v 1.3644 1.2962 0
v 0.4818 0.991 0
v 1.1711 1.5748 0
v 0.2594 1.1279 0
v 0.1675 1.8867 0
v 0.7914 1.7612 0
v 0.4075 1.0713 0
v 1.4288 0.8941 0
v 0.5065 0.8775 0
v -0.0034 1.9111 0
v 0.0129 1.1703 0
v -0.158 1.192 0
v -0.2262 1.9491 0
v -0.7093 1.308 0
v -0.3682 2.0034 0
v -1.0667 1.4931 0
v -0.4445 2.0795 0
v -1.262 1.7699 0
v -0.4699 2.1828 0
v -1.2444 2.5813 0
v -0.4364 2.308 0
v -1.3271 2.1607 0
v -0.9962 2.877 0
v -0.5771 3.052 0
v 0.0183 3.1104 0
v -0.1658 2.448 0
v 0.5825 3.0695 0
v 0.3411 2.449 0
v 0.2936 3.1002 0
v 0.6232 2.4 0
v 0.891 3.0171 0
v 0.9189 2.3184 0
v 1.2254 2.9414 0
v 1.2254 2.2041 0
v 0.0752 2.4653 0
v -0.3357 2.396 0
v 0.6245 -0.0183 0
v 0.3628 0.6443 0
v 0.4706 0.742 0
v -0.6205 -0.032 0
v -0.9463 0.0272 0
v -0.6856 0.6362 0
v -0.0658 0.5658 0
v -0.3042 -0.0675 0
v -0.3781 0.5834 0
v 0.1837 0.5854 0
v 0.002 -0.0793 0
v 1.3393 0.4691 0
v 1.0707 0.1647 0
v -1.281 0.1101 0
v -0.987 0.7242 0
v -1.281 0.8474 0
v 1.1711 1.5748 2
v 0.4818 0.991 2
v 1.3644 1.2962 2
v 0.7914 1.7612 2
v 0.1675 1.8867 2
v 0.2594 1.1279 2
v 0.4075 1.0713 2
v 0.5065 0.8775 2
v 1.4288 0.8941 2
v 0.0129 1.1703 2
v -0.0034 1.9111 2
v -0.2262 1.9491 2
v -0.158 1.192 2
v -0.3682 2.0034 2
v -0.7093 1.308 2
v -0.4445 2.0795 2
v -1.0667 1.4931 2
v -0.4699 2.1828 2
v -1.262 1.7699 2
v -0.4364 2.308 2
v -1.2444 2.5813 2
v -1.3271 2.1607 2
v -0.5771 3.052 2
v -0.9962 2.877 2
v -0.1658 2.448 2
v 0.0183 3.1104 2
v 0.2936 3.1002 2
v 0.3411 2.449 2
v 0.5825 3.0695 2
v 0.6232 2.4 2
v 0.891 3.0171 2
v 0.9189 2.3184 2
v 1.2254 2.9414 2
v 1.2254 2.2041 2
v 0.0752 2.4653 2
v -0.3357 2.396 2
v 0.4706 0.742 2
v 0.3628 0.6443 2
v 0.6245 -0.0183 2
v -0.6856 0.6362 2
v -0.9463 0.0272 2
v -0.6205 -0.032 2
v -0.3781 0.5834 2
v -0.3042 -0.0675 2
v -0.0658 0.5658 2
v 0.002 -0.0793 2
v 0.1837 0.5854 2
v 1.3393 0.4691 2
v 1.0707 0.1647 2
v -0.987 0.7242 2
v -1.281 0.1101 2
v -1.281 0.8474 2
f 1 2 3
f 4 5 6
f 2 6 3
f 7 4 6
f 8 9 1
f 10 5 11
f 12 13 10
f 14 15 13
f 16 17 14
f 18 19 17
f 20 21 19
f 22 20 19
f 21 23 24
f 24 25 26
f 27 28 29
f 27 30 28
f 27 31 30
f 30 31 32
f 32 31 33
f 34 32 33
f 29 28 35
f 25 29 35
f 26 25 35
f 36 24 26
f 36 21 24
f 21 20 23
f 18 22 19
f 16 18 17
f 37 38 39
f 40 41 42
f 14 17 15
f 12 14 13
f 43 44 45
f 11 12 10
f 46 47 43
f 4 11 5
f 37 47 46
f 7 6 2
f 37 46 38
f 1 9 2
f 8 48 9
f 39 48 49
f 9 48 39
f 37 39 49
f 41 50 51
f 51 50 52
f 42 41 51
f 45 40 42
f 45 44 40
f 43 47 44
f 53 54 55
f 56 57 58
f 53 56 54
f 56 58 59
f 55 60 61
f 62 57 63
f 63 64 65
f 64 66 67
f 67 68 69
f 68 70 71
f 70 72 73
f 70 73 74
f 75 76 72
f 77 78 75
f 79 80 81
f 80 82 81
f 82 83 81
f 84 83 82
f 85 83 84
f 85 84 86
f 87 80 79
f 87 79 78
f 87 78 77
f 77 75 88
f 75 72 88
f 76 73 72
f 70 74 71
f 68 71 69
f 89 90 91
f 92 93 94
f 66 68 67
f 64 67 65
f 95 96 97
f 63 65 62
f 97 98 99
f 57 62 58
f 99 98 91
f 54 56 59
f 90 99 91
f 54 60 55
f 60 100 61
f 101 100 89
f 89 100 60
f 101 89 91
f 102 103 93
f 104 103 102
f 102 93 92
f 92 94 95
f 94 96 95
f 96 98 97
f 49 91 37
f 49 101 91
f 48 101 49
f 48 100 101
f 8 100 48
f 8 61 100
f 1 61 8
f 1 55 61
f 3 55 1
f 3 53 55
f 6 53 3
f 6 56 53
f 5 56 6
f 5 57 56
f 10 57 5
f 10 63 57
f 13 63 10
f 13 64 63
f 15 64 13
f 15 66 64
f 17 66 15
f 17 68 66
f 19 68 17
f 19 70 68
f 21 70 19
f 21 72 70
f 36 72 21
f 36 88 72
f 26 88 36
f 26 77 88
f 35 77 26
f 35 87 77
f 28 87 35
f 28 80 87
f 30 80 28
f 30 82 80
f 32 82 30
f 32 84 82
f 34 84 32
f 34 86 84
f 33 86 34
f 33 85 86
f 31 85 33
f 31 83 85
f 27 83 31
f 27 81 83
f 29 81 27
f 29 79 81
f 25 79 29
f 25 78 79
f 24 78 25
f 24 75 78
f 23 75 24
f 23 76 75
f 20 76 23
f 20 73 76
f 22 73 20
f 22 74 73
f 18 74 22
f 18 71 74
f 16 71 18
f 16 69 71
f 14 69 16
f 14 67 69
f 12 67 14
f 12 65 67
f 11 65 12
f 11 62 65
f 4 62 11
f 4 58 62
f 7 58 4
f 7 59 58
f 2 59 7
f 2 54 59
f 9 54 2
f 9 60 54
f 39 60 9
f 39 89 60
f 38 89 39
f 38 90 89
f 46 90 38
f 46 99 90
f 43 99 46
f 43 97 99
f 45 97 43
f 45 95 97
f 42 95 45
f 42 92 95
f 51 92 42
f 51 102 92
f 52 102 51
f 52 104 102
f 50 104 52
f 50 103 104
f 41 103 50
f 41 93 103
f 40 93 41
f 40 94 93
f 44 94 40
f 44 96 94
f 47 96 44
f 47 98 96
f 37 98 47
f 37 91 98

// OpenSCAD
linear_extrude(2)
text("s", font="Verdana:style=Bold", size=4, halign="center");
